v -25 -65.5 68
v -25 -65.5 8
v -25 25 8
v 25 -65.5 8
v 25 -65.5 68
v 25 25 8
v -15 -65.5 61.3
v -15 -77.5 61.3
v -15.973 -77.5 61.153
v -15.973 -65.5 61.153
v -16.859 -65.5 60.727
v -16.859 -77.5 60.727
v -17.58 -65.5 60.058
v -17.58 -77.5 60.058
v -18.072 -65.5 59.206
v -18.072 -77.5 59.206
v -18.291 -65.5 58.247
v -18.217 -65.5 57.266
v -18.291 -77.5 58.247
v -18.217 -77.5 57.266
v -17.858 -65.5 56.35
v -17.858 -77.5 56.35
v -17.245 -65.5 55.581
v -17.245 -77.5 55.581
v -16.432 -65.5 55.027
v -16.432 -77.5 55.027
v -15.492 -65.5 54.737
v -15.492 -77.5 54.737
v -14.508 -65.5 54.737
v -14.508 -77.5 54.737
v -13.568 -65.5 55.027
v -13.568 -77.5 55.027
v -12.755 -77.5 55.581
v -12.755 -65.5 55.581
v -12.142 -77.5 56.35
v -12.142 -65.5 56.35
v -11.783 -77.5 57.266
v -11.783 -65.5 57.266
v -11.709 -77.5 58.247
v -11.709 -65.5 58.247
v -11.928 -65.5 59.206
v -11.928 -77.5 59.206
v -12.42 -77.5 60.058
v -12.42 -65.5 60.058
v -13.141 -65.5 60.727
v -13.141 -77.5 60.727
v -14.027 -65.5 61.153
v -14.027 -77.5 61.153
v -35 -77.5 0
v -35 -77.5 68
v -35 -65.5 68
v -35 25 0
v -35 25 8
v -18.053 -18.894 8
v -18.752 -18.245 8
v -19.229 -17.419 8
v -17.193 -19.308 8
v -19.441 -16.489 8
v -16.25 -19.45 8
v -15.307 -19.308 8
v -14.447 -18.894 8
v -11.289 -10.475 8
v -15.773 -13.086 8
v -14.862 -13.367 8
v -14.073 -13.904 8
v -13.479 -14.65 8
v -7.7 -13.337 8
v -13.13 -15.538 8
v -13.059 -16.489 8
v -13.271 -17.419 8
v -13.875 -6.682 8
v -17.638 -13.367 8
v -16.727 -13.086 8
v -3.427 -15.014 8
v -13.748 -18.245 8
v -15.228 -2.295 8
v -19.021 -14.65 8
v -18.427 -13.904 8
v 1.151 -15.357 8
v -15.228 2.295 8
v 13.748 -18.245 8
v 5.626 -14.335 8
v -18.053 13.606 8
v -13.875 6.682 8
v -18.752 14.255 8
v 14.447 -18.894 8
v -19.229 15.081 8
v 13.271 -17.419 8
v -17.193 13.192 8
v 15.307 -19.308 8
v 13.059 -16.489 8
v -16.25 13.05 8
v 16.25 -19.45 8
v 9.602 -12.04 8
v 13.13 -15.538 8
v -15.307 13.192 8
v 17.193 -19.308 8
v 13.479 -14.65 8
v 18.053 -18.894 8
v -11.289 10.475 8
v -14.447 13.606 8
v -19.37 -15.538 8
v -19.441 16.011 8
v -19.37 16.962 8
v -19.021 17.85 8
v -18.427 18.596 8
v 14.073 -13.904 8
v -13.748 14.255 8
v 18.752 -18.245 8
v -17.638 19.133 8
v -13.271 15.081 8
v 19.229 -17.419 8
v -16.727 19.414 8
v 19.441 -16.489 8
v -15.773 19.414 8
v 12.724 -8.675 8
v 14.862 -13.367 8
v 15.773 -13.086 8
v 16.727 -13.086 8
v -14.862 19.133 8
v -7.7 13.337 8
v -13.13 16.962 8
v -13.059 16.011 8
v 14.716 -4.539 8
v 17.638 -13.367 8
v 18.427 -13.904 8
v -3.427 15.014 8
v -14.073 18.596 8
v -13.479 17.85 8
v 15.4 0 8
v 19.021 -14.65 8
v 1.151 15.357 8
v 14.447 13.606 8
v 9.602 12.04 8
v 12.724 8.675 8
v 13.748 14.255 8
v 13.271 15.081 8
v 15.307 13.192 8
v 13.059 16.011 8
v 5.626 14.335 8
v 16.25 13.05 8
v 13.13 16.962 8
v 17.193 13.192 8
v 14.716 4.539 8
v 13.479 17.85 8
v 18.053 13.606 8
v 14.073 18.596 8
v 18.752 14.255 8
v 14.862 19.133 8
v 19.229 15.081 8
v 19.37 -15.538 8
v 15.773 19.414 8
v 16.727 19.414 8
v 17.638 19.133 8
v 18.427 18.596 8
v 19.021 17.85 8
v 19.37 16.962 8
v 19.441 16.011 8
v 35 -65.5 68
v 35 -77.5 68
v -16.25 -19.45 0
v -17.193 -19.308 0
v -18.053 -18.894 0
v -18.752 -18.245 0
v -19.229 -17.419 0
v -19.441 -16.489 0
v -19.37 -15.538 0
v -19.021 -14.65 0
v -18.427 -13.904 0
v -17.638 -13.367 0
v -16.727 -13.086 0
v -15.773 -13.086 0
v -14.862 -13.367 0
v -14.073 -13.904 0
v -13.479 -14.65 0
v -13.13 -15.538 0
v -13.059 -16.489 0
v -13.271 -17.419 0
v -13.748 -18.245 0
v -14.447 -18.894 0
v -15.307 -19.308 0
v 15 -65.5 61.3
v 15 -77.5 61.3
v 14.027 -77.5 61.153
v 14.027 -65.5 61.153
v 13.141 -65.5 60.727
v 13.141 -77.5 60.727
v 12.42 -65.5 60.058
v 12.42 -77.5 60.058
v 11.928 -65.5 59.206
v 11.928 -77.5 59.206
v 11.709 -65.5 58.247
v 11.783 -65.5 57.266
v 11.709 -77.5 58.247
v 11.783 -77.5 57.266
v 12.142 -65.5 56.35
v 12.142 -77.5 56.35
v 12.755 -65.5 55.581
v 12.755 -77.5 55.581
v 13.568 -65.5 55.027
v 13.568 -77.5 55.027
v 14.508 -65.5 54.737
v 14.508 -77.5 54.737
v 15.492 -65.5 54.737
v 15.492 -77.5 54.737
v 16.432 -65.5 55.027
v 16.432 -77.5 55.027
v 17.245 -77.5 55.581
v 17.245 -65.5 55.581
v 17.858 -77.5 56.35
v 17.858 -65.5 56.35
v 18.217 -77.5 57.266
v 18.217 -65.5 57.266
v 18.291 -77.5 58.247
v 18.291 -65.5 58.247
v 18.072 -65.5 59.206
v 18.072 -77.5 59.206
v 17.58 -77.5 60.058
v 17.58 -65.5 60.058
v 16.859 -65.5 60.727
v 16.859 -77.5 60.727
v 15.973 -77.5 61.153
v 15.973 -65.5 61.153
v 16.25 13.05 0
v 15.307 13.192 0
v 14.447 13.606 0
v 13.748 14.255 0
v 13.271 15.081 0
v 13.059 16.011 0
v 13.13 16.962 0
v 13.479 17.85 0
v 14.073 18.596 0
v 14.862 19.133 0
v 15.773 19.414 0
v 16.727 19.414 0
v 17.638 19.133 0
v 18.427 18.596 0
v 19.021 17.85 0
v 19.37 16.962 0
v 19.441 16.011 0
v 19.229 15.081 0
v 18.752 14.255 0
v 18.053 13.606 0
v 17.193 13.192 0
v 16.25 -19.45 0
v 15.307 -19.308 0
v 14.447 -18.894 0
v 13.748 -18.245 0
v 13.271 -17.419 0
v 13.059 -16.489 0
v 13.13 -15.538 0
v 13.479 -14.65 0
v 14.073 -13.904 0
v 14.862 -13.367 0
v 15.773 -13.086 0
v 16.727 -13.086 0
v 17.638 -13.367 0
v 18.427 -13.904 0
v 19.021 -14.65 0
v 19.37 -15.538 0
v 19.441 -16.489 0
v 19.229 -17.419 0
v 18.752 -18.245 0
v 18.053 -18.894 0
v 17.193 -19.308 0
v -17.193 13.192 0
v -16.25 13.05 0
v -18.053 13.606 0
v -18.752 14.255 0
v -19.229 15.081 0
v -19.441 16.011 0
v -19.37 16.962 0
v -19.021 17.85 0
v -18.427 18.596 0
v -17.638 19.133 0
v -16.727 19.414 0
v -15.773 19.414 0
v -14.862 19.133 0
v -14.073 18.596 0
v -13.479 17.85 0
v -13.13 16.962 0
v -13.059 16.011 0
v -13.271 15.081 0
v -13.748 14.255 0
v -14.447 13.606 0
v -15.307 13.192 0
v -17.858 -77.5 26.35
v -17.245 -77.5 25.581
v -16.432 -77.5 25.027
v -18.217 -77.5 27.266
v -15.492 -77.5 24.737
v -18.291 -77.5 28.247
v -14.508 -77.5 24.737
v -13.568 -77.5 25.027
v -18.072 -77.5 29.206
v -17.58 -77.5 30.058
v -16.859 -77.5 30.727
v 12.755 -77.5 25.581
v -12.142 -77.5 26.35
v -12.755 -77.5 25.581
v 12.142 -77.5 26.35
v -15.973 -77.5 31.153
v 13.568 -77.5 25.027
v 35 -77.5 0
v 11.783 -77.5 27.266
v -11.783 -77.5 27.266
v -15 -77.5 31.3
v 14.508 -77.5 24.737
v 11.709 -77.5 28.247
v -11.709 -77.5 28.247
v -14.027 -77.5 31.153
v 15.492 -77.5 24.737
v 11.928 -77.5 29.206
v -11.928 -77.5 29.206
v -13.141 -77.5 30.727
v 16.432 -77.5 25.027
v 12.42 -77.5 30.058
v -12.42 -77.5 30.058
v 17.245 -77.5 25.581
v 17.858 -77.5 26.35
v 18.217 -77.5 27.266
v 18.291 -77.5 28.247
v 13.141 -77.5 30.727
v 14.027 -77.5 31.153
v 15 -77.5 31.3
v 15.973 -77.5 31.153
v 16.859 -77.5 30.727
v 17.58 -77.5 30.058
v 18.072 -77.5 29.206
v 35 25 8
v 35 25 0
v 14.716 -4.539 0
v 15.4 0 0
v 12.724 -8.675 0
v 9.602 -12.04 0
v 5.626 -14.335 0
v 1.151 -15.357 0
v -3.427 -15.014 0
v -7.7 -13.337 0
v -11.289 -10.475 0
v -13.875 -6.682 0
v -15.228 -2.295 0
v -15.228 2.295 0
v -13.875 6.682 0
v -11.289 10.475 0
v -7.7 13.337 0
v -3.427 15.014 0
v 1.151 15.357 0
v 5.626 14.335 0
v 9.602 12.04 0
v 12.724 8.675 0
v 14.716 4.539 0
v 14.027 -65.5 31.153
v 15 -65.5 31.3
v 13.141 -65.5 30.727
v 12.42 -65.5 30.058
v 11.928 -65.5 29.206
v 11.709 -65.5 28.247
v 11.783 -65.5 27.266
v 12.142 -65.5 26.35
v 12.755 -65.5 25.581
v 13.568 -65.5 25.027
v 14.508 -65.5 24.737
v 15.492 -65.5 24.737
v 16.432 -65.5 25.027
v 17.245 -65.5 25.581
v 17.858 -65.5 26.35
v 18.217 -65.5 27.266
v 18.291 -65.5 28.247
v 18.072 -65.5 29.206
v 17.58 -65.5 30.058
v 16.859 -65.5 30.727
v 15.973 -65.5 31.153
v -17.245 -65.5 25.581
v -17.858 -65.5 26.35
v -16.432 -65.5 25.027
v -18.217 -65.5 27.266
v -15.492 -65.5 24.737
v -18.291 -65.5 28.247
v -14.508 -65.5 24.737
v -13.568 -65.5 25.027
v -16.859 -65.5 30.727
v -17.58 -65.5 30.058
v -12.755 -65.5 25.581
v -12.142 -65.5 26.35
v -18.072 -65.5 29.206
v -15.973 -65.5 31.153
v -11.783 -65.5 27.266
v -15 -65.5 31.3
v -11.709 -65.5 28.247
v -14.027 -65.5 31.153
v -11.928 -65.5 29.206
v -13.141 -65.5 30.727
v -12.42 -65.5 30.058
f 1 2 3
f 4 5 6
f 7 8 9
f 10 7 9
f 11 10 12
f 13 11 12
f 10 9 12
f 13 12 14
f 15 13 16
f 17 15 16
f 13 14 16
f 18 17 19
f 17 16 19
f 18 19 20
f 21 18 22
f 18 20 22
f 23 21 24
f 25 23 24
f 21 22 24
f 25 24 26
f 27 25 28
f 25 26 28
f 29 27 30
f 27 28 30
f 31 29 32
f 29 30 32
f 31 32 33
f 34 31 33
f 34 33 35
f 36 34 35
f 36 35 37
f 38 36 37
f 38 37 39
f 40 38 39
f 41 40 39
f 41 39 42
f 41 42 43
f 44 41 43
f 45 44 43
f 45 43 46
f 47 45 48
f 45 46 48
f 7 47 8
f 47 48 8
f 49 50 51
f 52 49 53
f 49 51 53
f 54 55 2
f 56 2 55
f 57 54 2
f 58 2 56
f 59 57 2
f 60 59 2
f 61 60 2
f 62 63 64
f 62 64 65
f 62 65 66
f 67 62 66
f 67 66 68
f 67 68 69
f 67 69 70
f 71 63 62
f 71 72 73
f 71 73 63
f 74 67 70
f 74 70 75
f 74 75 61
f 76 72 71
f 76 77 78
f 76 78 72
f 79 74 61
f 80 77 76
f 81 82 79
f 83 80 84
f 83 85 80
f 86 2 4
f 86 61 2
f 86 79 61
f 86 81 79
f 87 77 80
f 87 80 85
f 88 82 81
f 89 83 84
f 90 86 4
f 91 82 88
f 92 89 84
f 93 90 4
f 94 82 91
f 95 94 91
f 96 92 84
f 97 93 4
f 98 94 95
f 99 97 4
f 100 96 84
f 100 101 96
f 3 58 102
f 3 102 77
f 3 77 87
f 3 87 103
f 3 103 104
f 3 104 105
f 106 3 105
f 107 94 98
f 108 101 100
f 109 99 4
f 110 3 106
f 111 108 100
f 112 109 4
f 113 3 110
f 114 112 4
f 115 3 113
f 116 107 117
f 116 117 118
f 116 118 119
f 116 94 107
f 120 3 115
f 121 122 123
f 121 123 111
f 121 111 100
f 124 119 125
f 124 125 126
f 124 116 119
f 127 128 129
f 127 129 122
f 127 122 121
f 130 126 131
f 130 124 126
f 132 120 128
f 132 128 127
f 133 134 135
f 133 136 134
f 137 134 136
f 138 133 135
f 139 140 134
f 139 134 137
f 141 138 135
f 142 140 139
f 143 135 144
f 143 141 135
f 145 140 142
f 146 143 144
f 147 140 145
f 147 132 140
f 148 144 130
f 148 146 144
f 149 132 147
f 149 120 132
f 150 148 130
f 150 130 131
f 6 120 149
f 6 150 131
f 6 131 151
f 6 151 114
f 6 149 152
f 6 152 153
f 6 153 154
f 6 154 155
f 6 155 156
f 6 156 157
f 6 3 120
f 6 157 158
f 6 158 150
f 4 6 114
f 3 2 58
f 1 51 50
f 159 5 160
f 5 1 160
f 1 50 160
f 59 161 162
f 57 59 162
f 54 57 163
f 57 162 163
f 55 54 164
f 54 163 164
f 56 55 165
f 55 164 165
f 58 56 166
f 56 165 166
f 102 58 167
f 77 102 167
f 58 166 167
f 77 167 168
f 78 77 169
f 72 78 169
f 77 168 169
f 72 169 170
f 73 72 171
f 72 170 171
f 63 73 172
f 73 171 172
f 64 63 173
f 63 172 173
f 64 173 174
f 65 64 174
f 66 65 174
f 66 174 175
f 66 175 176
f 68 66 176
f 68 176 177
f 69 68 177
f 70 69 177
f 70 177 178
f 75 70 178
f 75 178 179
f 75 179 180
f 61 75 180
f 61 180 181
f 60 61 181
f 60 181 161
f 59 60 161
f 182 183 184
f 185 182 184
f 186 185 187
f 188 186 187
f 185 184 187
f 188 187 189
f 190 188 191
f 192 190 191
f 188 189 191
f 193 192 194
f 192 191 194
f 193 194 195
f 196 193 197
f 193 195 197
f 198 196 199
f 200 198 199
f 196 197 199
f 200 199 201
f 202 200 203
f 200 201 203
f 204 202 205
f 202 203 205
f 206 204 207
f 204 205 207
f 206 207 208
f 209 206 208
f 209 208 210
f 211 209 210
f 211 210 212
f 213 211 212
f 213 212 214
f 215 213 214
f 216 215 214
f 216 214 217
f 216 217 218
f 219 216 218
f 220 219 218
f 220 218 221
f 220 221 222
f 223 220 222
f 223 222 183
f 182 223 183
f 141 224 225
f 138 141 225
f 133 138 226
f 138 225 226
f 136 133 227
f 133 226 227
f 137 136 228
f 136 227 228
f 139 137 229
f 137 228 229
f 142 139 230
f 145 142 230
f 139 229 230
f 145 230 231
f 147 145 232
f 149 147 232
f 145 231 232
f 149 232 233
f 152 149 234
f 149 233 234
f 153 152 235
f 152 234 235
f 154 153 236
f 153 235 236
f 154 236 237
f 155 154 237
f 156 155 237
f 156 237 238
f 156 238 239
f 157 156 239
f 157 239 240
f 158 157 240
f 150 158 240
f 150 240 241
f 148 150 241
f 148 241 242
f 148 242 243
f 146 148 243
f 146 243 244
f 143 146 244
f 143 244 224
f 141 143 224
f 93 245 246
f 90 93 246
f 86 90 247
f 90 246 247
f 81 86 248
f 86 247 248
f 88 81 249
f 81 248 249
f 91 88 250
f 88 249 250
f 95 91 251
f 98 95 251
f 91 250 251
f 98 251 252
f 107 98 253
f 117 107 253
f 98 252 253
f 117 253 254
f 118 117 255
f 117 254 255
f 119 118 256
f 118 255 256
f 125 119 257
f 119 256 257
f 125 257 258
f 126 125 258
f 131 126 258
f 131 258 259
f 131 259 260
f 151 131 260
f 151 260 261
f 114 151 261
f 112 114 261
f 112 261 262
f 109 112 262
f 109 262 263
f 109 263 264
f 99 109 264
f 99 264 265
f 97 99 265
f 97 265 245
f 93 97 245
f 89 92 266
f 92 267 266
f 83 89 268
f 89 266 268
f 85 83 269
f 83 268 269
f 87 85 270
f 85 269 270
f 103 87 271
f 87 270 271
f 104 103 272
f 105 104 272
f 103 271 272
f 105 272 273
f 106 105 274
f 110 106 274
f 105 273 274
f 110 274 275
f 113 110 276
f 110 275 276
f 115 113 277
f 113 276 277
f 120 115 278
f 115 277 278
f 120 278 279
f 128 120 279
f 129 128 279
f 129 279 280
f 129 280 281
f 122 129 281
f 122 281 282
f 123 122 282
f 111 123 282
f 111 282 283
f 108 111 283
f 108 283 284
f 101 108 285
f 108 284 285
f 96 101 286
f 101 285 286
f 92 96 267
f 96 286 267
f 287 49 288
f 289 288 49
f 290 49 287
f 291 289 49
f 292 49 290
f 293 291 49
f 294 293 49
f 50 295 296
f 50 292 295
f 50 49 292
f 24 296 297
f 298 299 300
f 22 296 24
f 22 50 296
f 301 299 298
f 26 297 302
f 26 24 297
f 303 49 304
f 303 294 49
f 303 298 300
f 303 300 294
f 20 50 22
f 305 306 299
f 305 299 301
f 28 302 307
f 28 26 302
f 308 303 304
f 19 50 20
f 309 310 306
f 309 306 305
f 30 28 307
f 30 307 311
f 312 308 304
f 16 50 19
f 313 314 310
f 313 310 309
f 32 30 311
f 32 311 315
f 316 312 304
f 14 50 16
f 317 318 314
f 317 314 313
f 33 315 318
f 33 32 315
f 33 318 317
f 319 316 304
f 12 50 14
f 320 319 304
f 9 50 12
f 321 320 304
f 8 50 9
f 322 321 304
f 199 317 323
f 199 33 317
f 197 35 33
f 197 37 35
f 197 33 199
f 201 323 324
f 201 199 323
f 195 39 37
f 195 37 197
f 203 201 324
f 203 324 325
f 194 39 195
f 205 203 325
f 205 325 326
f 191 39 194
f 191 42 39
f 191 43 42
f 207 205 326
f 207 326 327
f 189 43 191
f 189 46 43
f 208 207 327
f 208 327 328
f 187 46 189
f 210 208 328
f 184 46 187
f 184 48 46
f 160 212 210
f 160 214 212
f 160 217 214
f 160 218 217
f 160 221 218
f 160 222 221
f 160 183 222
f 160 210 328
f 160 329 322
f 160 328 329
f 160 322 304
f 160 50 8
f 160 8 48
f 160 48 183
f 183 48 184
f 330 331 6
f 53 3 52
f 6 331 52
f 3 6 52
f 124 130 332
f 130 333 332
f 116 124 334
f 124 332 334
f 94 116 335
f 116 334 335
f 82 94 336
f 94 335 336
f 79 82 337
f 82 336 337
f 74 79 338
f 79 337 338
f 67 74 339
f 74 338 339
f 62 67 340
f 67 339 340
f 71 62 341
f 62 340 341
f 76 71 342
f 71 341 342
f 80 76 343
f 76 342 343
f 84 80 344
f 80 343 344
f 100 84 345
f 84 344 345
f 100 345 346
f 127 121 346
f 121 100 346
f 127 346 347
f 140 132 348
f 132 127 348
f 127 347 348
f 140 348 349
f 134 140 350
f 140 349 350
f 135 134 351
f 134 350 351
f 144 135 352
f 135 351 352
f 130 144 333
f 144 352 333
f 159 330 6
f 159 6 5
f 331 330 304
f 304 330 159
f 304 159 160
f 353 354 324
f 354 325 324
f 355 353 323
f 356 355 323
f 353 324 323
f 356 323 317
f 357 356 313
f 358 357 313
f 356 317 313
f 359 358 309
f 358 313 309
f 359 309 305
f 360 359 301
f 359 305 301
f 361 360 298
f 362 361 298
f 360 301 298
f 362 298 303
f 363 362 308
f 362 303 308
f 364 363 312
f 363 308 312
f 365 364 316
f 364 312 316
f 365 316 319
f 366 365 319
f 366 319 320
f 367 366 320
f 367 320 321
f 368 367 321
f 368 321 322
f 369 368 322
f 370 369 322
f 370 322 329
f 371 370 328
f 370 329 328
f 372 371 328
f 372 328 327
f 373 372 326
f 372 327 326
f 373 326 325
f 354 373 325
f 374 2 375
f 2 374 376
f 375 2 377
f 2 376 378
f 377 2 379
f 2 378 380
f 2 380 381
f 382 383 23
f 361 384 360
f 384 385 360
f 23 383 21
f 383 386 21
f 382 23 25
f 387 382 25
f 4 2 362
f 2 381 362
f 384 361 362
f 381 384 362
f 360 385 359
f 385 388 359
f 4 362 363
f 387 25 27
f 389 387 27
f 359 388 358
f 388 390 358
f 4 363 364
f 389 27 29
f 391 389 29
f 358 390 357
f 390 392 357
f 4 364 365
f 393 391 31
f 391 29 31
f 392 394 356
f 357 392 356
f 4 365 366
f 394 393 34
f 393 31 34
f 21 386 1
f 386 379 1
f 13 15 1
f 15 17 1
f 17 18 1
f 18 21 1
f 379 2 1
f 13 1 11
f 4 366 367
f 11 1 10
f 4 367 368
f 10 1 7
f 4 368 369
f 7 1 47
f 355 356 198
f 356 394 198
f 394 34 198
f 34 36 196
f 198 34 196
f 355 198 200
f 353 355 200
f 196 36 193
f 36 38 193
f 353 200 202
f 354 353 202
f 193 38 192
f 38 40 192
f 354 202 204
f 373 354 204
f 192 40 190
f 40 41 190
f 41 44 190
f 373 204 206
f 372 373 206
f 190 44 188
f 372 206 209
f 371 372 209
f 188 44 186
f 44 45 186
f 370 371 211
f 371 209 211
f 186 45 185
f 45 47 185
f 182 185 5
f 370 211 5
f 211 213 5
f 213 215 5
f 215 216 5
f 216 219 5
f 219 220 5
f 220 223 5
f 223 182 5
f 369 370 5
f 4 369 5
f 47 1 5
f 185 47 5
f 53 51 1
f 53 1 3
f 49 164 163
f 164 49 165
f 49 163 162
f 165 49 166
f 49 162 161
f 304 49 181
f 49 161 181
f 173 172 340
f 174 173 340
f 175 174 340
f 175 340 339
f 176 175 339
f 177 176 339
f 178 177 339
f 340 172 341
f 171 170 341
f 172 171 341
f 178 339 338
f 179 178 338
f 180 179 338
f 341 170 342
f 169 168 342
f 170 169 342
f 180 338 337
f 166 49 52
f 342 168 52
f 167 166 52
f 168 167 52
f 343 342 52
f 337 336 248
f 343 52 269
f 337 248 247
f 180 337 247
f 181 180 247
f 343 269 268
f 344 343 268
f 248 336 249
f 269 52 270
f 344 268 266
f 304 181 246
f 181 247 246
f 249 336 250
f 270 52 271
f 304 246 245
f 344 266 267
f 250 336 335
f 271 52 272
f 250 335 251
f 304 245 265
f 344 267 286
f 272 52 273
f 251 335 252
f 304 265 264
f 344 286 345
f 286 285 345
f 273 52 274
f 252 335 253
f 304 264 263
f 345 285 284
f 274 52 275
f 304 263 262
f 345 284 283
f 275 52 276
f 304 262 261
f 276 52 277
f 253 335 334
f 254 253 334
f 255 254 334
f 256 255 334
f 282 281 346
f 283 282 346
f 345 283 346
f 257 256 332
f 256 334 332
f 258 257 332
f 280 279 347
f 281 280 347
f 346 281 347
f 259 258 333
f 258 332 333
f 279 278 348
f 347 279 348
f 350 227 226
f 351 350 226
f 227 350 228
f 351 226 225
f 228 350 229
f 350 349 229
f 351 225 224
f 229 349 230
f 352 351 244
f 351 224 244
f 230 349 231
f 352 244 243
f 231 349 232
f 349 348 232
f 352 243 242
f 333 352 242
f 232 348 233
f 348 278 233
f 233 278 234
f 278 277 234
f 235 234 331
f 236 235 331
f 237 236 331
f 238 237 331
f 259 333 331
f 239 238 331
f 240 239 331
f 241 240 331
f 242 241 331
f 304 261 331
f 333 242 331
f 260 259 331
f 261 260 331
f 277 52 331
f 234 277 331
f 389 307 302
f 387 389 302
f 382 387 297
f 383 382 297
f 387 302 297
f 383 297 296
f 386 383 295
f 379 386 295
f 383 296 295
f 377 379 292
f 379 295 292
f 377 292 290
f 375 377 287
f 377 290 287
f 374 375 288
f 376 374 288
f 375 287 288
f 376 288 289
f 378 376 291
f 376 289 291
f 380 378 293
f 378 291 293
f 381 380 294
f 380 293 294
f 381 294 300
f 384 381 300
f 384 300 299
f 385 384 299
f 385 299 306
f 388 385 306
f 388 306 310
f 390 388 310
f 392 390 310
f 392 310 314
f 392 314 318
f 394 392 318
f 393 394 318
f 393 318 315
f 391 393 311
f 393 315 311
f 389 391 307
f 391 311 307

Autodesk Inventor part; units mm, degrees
ref_plane "YZ Plane" through (0, 0, 0) normal (1, 0, 0) x (0, 1, 0)
ref_plane "XZ Plane" through (0, 0, 0) normal (0, 1, 0) x (-1, 0, 0)
ref_plane "XY Plane" through (0, 0, 0) normal (0, 0, 1) x (1, 0, 0)
sketch "Sketch1" plane through (0, 0, 0) normal (0, 0, 1) x (1, 0, 0)
  line L0 (-35, -25) -> (35, -25)
  line L1 (35, -25) -> (35, 25)
  line L2 (35, 25) -> (-35, 25)
  line L3 (-35, 25) -> (-35, -25)
  line L4 (-35, -25) -> (35, 25) construction
  line L5 (35, -25) -> (-35, 25) construction
  circle A0 centre (0, 0) radius 15.4
  dimension "d0" = 70
  dimension "d1" = 50
  dimension "d2" = 30.8
extrude "Extrusion1" add sketch "Sketch1" along normal blind 8
sketch "Sketch2" plane through (0, 0, 8) normal (0, 0, 1) x (1, 0, 0)
  line L0 (35, -25) -> (35, 25) projected
  line L1 (35, 25) -> (-35, 25) projected
  line L2 (-35, 25) -> (-35, -25) projected
  line L3 (-35, -25) -> (35, -25) projected
  circle A0 centre (0, 0) radius 15.4 projected
  line L4 (16.25, -16.25) -> (-16.25, -16.25) construction
  line L5 (-16.25, -16.25) -> (-16.25, 16.25) construction
  line L6 (-16.25, 16.25) -> (16.25, 16.25) construction
  line L7 (16.25, 16.25) -> (16.25, -16.25) construction
  line L8 (16.25, -16.25) -> (-16.25, 16.25) construction
  line L9 (-16.25, -16.25) -> (16.25, 16.25) construction
  dimension "d5" = 32.5
  dimension "d6" = 32.5
hole "Hole1" at (-16.25, 16.25, 8) at (16.25, 16.25, 8) at (16.25, -16.25, 8) at (-16.25, -16.25, 8) direction (0, 0, -1) diameter 6.4 end through all clearance for "Hex Head Cap Screw ISO 24017" size "M6" standard "ISO"
sketch "Sketch3" plane through (0, 0, 8) normal (0, 0, 1) x (1, 0, 0)
  circle A0 centre (0, 0) radius 15.4 projected
  circle A1 centre (-16.25, -16.25) radius 3.2 projected
  circle A2 centre (16.25, -16.25) radius 3.2 projected
  circle A3 centre (16.25, 16.25) radius 3.2 projected
  circle A4 centre (-16.25, 16.25) radius 3.2 projected
  line L0 (35, -25) -> (35, 25) projected
  line L1 (35, 25) -> (-35, 25) projected
  line L2 (-35, 25) -> (-35, -25) projected
  line L3 (-35, -25) -> (35, -25) projected
  circle A5 centre (0, 0) radius 15.4 projected
  line L4 (-35, -25) -> (35, -25)
  line L5 (35, -25) -> (35, -77.5)
  line L6 (35, -77.5) -> (-35, -77.5)
  line L7 (-35, -77.5) -> (-35, -25)
  dimension "d14" = 77.5
extrude "Extrusion2" add sketch "Sketch3" against normal up to surface (8 mm away) contours L5 L6 L7 L3
sketch "Sketch4" plane through (-35, 25, 0) normal (-1, 0, 0) x (0, 0, 1)
  line L0 (0, 0) -> (0, -102.5) projected
  line L1 (8, -102.5) -> (0, -102.5) projected
  line L2 (8, 0) -> (8, -102.5) projected
  line L3 (0, 0) -> (8, 0) projected
  line L4 (8, -102.5) -> (68, -102.5)
  line L5 (68, -102.5) -> (68, -90.5)
  line L6 (68, -90.5) -> (8, -90.5)
  line L7 (8, -90.5) -> (8, -102.5)
  line L8 (68, -90.5) -> (8, 0)
  point P0 (0, -25)
  dimension "d17" = 60
  dimension "d18" = 12
extrude "Extrusion3" add sketch "Sketch4" against normal blind 10 contours L8 L6 L2 | L2 L6 L5 L4
mirror "Mirror1" about plane through (0, 0, 0) normal (1, 0, 0) of "Extrusion3"
sketch "Sketch5" plane through (-35, -77.5, 0) normal (0, -1, 0) x (1, 0, 0)
  line L0 (10, 68) -> (10, 8) projected
  line L1 (60, 68) -> (60, 8) projected
  line L2 (10, 8) -> (60, 8) projected
  line L3 (10, 68) -> (60, 68)
  point P0 (35, 0)
extrude "Extrusion4" add sketch "Sketch5" against normal blind 12
sketch "Sketch6" plane through (-35, -65.5, 0) normal (0, 1, 0) x (1, 0, 0)
  line L0 (10, -68) -> (10, -8) projected
  line L1 (10, -68) -> (60, -68) projected
  line L2 (60, -8) -> (60, -68) projected
  line L3 (10, -8) -> (60, -8) projected
  line L4 (50, -18) -> (50, -58) construction
  line L5 (50, -58) -> (20, -58) construction
  line L6 (20, -58) -> (20, -18) construction
  line L7 (20, -18) -> (50, -18) construction
  point P0 (35, 0)
  dimension "d23" = 10
hole "Hole2" at (-15, -65.5, 18) at (-15, -65.5, 58) at (15, -65.5, 18) at (15, -65.5, 58) direction (0, -1, 0) diameter 6.6 end through all clearance for "Hex Head Cap Screw ISO 24017" size "M6" standard "ISO"
move faces "Move1" translate (0, 0, 10) faces at (15.2655, -69.5, 21.2893) (-14.7345, -69.5, 21.2893)
properties part number "Part6_3DPrint"
